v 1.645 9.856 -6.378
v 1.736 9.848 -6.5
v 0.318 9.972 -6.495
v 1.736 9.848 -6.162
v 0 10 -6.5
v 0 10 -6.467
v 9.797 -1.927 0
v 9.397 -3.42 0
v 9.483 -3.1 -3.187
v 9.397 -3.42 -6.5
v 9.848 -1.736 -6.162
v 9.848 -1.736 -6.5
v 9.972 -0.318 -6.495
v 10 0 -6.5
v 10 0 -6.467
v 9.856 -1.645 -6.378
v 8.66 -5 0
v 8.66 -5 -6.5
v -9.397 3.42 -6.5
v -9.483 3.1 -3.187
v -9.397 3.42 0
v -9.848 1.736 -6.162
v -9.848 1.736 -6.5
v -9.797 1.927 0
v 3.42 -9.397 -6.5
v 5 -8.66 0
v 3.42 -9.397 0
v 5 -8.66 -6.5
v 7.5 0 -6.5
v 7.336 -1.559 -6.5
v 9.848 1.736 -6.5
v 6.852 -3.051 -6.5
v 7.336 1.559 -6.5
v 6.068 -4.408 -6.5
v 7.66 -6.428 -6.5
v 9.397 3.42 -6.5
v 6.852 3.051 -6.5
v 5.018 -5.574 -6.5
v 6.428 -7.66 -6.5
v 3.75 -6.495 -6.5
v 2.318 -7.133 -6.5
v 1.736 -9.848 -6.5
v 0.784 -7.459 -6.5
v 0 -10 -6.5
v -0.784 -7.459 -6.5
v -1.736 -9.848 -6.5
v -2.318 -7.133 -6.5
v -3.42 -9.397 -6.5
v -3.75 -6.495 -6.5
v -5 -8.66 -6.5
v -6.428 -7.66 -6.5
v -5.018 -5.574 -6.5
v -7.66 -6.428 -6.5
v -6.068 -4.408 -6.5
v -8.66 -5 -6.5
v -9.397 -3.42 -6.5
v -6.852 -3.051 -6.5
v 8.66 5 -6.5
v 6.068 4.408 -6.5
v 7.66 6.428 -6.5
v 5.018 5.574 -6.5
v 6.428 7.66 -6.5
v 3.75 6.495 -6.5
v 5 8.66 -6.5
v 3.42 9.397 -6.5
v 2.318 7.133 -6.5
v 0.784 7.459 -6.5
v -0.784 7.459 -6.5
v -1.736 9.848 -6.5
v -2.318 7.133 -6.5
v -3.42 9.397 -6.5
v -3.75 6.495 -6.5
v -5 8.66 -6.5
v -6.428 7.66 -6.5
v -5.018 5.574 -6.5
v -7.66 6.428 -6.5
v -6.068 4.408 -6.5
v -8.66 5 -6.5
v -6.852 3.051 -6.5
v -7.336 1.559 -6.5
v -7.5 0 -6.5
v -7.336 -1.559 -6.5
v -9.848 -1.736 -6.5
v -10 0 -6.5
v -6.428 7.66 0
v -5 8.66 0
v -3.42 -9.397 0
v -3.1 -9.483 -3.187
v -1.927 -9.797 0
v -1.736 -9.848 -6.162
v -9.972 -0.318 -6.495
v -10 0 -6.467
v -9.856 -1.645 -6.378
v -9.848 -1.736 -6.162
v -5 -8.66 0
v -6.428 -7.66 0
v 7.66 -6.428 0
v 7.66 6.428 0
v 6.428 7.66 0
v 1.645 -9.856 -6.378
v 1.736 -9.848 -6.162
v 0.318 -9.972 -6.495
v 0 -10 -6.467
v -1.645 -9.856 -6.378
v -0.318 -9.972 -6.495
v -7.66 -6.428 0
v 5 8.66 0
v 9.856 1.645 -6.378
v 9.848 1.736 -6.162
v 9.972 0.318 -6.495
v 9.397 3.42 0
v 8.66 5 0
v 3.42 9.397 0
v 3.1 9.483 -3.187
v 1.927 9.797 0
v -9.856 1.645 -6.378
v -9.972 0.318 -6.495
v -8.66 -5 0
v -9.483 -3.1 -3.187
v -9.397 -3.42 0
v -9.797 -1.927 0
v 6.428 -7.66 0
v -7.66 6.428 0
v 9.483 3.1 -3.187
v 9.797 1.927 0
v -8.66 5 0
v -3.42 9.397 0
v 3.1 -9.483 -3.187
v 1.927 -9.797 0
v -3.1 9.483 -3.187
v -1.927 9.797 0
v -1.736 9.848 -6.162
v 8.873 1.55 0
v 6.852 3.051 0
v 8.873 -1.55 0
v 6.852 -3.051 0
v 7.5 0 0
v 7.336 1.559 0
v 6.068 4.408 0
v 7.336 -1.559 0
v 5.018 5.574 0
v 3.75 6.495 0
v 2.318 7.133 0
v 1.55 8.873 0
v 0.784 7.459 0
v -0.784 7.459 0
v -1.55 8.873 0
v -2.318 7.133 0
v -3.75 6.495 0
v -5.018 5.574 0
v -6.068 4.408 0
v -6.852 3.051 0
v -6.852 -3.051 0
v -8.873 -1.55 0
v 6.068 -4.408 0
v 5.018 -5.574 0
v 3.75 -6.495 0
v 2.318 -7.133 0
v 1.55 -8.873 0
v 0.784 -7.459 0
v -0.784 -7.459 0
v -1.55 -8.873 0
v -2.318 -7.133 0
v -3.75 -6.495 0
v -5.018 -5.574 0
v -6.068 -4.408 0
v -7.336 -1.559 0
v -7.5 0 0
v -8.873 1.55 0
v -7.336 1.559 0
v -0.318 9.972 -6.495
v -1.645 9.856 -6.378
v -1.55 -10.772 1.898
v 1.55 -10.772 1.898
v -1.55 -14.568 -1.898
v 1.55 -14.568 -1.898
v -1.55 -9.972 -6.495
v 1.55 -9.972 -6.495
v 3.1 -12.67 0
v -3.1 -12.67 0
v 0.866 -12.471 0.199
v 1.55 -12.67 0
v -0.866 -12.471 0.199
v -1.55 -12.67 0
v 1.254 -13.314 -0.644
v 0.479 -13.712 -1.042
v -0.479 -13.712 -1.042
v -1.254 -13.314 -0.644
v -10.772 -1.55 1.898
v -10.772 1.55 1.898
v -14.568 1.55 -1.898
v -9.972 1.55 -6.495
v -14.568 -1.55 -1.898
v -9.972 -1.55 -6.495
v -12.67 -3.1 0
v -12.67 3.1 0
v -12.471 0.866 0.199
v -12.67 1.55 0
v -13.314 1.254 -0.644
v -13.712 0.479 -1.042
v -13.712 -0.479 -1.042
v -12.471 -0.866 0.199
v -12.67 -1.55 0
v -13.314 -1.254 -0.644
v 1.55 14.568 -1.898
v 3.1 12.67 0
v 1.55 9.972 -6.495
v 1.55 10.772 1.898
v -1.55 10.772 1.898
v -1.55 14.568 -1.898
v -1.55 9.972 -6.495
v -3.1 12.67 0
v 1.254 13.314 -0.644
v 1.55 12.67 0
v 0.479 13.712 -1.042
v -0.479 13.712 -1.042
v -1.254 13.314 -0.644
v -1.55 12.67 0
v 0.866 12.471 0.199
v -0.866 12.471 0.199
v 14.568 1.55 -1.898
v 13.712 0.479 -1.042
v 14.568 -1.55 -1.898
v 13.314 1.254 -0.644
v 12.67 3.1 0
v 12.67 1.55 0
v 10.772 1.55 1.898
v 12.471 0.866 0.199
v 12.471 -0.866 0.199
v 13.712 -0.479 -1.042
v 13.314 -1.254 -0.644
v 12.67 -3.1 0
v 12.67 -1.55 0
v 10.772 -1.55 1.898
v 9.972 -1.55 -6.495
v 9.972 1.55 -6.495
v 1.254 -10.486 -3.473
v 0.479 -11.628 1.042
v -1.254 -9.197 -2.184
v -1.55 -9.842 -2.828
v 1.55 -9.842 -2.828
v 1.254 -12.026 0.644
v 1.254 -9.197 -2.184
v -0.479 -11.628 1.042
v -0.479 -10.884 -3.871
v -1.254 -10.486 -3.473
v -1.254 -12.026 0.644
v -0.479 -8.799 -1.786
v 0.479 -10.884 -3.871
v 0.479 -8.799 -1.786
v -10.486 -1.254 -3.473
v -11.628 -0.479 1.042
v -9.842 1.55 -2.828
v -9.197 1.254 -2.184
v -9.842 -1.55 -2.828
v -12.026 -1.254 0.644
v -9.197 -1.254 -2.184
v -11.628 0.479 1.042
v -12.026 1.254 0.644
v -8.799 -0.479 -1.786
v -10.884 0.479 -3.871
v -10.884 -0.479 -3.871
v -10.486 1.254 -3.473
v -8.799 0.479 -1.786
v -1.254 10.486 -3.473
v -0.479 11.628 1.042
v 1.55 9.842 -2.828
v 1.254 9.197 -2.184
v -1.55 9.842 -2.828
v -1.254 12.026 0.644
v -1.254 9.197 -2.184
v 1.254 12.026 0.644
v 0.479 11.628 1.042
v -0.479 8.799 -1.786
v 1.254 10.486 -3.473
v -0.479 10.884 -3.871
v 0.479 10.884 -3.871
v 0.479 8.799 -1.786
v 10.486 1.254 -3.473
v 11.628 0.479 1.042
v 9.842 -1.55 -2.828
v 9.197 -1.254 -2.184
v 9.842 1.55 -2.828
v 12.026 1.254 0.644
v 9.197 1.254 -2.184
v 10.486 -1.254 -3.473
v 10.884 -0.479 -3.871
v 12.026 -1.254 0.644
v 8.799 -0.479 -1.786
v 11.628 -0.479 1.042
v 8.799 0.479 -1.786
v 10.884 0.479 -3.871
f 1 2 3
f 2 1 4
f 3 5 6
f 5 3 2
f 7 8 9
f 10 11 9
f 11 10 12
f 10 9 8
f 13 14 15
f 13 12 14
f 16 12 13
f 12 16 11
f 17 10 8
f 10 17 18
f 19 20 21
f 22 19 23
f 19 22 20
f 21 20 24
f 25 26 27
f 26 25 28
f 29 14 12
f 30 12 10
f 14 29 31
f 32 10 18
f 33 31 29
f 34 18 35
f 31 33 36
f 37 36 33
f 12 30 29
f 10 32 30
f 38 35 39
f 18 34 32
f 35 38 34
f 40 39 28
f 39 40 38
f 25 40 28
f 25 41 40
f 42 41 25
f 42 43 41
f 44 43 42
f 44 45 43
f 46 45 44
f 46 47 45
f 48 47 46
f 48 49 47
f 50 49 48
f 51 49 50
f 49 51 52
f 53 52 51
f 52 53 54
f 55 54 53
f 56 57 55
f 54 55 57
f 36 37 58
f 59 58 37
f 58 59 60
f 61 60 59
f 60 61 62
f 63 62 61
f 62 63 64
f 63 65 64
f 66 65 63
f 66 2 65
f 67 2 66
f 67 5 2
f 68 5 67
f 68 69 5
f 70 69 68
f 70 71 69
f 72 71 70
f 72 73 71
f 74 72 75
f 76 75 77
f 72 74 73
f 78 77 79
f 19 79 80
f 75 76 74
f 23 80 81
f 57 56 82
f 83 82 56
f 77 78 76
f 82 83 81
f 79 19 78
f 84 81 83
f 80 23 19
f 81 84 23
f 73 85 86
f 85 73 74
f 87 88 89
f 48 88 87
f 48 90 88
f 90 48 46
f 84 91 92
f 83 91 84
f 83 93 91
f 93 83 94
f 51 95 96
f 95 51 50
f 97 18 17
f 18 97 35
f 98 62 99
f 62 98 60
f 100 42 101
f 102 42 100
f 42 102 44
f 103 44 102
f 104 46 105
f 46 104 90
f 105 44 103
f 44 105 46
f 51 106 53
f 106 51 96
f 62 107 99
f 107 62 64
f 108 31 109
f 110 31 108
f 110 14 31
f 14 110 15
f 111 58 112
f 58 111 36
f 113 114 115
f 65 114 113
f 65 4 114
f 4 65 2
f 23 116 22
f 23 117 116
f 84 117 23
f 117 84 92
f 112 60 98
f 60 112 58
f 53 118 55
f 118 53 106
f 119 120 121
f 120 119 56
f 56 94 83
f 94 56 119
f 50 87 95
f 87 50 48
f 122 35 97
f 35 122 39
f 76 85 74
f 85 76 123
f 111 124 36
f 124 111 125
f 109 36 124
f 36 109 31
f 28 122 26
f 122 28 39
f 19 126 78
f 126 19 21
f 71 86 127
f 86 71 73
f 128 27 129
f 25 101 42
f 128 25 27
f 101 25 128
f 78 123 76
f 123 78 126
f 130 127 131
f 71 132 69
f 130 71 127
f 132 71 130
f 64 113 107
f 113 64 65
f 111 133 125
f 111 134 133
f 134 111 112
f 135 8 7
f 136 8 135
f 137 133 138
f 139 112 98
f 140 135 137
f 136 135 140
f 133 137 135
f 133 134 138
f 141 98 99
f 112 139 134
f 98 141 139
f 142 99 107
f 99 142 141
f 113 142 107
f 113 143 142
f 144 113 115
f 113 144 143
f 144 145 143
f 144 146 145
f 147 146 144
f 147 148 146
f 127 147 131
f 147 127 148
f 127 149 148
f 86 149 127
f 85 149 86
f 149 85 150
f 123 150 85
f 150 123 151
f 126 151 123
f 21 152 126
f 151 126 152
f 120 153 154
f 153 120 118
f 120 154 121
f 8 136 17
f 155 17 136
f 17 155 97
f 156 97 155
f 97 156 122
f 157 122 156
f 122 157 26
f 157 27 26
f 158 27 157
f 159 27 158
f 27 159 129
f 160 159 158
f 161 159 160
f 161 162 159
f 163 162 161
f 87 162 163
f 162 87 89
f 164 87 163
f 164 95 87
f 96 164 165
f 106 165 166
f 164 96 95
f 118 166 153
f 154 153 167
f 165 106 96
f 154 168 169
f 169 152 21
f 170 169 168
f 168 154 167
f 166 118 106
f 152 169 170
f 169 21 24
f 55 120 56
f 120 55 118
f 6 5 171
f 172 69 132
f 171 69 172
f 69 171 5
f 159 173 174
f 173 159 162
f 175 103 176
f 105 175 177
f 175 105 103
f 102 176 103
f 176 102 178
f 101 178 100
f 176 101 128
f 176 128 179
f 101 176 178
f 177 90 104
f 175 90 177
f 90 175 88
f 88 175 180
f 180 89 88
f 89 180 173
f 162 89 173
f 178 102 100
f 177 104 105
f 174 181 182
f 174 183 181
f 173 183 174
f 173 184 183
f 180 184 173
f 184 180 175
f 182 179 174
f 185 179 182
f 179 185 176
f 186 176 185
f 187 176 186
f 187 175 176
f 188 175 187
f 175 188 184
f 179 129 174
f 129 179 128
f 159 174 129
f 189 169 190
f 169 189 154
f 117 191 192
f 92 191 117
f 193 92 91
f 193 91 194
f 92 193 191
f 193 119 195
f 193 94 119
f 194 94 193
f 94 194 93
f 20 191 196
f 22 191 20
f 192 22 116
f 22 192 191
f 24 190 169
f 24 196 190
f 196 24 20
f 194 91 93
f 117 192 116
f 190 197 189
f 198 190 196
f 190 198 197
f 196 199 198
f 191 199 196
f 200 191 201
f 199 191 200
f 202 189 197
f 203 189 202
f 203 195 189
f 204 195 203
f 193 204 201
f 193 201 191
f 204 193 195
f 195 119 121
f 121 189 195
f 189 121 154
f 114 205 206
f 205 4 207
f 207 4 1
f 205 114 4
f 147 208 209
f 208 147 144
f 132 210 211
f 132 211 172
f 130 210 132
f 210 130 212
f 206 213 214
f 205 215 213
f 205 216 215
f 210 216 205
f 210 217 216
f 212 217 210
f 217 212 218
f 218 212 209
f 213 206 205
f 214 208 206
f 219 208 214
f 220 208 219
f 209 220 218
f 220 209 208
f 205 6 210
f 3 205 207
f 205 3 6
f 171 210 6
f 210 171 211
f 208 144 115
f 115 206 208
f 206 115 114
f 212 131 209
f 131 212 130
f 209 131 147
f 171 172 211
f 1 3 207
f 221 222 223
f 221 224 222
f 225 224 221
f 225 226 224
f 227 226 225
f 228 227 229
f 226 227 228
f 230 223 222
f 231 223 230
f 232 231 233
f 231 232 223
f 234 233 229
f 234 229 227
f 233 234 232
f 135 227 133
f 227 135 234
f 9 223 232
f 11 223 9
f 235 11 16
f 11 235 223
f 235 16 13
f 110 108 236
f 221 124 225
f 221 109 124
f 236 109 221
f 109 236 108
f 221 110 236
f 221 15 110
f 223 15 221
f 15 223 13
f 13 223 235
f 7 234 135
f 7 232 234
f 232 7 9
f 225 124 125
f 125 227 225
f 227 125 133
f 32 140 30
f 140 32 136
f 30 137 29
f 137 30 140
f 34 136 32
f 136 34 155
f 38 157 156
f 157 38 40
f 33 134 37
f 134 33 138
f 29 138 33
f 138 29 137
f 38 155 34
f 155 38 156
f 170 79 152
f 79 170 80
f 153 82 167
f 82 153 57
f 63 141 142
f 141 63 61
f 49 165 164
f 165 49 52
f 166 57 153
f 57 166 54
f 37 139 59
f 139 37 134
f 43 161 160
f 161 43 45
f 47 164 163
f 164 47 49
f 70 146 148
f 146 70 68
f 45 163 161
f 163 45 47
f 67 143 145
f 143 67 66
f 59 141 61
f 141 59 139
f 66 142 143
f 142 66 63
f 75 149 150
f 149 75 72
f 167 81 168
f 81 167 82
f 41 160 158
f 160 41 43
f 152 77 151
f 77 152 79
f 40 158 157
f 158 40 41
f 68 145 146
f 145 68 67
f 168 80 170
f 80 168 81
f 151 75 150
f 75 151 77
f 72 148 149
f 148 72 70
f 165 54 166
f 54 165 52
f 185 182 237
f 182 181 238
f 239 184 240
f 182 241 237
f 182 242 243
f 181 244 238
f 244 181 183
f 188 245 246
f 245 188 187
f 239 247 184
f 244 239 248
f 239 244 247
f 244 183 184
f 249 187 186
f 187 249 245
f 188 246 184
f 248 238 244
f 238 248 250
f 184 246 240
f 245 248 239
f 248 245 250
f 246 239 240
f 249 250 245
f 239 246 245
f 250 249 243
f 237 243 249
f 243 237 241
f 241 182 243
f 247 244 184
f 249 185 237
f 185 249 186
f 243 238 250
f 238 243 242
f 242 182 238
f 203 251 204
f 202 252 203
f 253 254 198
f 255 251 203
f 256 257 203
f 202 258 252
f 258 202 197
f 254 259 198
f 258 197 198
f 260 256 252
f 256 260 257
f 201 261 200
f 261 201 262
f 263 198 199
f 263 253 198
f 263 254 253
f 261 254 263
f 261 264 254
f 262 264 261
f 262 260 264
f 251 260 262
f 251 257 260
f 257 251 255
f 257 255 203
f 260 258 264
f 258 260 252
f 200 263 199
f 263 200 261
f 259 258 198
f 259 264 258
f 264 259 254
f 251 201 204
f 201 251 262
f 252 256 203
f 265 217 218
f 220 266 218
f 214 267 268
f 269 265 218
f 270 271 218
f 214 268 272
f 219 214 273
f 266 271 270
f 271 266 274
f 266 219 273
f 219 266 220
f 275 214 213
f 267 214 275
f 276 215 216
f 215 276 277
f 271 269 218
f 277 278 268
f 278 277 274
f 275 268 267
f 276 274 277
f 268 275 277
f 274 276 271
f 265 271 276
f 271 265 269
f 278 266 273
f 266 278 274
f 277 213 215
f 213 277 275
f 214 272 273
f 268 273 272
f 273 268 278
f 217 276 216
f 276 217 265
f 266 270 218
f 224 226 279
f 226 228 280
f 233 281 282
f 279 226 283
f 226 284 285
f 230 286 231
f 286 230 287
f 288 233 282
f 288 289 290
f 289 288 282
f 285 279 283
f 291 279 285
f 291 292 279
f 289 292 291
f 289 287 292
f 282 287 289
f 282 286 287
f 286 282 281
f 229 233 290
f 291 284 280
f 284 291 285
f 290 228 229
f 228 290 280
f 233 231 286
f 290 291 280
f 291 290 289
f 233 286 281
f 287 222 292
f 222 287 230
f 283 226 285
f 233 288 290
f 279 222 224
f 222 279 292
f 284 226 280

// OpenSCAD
//basic unit
//design parameters
sp = 25.34;




module con(r2=6.2,h2=13){
		translate([0,sp,0])rotate([45,0,0])cylinder(r=r2,h=h2,$fn=6);
}	

module con_hole(r1=3.1, h1=8){
	translate([0,sp,0])rotate([45,0,0])cylinder(r=r1,h=h1);
}

rotate([180,0,0]){
scale([0.5,0.5,0.5]){
difference(){
	union(){
		cylinder(r=20, h=13,center=false,$fn=36);
		con();
		rotate([0,0,90])con();
		rotate([0,0,180])con();
		rotate([0,0,270])con();
	}
	cylinder(r=15,h=30,center=false);
	con_hole();
	rotate([0,0,90])con_hole();
	rotate([0,0,180])con_hole();
	rotate([0,0,270])con_hole();

}
}
}
//translate([sp/2,0,0])sphere(r=1);
